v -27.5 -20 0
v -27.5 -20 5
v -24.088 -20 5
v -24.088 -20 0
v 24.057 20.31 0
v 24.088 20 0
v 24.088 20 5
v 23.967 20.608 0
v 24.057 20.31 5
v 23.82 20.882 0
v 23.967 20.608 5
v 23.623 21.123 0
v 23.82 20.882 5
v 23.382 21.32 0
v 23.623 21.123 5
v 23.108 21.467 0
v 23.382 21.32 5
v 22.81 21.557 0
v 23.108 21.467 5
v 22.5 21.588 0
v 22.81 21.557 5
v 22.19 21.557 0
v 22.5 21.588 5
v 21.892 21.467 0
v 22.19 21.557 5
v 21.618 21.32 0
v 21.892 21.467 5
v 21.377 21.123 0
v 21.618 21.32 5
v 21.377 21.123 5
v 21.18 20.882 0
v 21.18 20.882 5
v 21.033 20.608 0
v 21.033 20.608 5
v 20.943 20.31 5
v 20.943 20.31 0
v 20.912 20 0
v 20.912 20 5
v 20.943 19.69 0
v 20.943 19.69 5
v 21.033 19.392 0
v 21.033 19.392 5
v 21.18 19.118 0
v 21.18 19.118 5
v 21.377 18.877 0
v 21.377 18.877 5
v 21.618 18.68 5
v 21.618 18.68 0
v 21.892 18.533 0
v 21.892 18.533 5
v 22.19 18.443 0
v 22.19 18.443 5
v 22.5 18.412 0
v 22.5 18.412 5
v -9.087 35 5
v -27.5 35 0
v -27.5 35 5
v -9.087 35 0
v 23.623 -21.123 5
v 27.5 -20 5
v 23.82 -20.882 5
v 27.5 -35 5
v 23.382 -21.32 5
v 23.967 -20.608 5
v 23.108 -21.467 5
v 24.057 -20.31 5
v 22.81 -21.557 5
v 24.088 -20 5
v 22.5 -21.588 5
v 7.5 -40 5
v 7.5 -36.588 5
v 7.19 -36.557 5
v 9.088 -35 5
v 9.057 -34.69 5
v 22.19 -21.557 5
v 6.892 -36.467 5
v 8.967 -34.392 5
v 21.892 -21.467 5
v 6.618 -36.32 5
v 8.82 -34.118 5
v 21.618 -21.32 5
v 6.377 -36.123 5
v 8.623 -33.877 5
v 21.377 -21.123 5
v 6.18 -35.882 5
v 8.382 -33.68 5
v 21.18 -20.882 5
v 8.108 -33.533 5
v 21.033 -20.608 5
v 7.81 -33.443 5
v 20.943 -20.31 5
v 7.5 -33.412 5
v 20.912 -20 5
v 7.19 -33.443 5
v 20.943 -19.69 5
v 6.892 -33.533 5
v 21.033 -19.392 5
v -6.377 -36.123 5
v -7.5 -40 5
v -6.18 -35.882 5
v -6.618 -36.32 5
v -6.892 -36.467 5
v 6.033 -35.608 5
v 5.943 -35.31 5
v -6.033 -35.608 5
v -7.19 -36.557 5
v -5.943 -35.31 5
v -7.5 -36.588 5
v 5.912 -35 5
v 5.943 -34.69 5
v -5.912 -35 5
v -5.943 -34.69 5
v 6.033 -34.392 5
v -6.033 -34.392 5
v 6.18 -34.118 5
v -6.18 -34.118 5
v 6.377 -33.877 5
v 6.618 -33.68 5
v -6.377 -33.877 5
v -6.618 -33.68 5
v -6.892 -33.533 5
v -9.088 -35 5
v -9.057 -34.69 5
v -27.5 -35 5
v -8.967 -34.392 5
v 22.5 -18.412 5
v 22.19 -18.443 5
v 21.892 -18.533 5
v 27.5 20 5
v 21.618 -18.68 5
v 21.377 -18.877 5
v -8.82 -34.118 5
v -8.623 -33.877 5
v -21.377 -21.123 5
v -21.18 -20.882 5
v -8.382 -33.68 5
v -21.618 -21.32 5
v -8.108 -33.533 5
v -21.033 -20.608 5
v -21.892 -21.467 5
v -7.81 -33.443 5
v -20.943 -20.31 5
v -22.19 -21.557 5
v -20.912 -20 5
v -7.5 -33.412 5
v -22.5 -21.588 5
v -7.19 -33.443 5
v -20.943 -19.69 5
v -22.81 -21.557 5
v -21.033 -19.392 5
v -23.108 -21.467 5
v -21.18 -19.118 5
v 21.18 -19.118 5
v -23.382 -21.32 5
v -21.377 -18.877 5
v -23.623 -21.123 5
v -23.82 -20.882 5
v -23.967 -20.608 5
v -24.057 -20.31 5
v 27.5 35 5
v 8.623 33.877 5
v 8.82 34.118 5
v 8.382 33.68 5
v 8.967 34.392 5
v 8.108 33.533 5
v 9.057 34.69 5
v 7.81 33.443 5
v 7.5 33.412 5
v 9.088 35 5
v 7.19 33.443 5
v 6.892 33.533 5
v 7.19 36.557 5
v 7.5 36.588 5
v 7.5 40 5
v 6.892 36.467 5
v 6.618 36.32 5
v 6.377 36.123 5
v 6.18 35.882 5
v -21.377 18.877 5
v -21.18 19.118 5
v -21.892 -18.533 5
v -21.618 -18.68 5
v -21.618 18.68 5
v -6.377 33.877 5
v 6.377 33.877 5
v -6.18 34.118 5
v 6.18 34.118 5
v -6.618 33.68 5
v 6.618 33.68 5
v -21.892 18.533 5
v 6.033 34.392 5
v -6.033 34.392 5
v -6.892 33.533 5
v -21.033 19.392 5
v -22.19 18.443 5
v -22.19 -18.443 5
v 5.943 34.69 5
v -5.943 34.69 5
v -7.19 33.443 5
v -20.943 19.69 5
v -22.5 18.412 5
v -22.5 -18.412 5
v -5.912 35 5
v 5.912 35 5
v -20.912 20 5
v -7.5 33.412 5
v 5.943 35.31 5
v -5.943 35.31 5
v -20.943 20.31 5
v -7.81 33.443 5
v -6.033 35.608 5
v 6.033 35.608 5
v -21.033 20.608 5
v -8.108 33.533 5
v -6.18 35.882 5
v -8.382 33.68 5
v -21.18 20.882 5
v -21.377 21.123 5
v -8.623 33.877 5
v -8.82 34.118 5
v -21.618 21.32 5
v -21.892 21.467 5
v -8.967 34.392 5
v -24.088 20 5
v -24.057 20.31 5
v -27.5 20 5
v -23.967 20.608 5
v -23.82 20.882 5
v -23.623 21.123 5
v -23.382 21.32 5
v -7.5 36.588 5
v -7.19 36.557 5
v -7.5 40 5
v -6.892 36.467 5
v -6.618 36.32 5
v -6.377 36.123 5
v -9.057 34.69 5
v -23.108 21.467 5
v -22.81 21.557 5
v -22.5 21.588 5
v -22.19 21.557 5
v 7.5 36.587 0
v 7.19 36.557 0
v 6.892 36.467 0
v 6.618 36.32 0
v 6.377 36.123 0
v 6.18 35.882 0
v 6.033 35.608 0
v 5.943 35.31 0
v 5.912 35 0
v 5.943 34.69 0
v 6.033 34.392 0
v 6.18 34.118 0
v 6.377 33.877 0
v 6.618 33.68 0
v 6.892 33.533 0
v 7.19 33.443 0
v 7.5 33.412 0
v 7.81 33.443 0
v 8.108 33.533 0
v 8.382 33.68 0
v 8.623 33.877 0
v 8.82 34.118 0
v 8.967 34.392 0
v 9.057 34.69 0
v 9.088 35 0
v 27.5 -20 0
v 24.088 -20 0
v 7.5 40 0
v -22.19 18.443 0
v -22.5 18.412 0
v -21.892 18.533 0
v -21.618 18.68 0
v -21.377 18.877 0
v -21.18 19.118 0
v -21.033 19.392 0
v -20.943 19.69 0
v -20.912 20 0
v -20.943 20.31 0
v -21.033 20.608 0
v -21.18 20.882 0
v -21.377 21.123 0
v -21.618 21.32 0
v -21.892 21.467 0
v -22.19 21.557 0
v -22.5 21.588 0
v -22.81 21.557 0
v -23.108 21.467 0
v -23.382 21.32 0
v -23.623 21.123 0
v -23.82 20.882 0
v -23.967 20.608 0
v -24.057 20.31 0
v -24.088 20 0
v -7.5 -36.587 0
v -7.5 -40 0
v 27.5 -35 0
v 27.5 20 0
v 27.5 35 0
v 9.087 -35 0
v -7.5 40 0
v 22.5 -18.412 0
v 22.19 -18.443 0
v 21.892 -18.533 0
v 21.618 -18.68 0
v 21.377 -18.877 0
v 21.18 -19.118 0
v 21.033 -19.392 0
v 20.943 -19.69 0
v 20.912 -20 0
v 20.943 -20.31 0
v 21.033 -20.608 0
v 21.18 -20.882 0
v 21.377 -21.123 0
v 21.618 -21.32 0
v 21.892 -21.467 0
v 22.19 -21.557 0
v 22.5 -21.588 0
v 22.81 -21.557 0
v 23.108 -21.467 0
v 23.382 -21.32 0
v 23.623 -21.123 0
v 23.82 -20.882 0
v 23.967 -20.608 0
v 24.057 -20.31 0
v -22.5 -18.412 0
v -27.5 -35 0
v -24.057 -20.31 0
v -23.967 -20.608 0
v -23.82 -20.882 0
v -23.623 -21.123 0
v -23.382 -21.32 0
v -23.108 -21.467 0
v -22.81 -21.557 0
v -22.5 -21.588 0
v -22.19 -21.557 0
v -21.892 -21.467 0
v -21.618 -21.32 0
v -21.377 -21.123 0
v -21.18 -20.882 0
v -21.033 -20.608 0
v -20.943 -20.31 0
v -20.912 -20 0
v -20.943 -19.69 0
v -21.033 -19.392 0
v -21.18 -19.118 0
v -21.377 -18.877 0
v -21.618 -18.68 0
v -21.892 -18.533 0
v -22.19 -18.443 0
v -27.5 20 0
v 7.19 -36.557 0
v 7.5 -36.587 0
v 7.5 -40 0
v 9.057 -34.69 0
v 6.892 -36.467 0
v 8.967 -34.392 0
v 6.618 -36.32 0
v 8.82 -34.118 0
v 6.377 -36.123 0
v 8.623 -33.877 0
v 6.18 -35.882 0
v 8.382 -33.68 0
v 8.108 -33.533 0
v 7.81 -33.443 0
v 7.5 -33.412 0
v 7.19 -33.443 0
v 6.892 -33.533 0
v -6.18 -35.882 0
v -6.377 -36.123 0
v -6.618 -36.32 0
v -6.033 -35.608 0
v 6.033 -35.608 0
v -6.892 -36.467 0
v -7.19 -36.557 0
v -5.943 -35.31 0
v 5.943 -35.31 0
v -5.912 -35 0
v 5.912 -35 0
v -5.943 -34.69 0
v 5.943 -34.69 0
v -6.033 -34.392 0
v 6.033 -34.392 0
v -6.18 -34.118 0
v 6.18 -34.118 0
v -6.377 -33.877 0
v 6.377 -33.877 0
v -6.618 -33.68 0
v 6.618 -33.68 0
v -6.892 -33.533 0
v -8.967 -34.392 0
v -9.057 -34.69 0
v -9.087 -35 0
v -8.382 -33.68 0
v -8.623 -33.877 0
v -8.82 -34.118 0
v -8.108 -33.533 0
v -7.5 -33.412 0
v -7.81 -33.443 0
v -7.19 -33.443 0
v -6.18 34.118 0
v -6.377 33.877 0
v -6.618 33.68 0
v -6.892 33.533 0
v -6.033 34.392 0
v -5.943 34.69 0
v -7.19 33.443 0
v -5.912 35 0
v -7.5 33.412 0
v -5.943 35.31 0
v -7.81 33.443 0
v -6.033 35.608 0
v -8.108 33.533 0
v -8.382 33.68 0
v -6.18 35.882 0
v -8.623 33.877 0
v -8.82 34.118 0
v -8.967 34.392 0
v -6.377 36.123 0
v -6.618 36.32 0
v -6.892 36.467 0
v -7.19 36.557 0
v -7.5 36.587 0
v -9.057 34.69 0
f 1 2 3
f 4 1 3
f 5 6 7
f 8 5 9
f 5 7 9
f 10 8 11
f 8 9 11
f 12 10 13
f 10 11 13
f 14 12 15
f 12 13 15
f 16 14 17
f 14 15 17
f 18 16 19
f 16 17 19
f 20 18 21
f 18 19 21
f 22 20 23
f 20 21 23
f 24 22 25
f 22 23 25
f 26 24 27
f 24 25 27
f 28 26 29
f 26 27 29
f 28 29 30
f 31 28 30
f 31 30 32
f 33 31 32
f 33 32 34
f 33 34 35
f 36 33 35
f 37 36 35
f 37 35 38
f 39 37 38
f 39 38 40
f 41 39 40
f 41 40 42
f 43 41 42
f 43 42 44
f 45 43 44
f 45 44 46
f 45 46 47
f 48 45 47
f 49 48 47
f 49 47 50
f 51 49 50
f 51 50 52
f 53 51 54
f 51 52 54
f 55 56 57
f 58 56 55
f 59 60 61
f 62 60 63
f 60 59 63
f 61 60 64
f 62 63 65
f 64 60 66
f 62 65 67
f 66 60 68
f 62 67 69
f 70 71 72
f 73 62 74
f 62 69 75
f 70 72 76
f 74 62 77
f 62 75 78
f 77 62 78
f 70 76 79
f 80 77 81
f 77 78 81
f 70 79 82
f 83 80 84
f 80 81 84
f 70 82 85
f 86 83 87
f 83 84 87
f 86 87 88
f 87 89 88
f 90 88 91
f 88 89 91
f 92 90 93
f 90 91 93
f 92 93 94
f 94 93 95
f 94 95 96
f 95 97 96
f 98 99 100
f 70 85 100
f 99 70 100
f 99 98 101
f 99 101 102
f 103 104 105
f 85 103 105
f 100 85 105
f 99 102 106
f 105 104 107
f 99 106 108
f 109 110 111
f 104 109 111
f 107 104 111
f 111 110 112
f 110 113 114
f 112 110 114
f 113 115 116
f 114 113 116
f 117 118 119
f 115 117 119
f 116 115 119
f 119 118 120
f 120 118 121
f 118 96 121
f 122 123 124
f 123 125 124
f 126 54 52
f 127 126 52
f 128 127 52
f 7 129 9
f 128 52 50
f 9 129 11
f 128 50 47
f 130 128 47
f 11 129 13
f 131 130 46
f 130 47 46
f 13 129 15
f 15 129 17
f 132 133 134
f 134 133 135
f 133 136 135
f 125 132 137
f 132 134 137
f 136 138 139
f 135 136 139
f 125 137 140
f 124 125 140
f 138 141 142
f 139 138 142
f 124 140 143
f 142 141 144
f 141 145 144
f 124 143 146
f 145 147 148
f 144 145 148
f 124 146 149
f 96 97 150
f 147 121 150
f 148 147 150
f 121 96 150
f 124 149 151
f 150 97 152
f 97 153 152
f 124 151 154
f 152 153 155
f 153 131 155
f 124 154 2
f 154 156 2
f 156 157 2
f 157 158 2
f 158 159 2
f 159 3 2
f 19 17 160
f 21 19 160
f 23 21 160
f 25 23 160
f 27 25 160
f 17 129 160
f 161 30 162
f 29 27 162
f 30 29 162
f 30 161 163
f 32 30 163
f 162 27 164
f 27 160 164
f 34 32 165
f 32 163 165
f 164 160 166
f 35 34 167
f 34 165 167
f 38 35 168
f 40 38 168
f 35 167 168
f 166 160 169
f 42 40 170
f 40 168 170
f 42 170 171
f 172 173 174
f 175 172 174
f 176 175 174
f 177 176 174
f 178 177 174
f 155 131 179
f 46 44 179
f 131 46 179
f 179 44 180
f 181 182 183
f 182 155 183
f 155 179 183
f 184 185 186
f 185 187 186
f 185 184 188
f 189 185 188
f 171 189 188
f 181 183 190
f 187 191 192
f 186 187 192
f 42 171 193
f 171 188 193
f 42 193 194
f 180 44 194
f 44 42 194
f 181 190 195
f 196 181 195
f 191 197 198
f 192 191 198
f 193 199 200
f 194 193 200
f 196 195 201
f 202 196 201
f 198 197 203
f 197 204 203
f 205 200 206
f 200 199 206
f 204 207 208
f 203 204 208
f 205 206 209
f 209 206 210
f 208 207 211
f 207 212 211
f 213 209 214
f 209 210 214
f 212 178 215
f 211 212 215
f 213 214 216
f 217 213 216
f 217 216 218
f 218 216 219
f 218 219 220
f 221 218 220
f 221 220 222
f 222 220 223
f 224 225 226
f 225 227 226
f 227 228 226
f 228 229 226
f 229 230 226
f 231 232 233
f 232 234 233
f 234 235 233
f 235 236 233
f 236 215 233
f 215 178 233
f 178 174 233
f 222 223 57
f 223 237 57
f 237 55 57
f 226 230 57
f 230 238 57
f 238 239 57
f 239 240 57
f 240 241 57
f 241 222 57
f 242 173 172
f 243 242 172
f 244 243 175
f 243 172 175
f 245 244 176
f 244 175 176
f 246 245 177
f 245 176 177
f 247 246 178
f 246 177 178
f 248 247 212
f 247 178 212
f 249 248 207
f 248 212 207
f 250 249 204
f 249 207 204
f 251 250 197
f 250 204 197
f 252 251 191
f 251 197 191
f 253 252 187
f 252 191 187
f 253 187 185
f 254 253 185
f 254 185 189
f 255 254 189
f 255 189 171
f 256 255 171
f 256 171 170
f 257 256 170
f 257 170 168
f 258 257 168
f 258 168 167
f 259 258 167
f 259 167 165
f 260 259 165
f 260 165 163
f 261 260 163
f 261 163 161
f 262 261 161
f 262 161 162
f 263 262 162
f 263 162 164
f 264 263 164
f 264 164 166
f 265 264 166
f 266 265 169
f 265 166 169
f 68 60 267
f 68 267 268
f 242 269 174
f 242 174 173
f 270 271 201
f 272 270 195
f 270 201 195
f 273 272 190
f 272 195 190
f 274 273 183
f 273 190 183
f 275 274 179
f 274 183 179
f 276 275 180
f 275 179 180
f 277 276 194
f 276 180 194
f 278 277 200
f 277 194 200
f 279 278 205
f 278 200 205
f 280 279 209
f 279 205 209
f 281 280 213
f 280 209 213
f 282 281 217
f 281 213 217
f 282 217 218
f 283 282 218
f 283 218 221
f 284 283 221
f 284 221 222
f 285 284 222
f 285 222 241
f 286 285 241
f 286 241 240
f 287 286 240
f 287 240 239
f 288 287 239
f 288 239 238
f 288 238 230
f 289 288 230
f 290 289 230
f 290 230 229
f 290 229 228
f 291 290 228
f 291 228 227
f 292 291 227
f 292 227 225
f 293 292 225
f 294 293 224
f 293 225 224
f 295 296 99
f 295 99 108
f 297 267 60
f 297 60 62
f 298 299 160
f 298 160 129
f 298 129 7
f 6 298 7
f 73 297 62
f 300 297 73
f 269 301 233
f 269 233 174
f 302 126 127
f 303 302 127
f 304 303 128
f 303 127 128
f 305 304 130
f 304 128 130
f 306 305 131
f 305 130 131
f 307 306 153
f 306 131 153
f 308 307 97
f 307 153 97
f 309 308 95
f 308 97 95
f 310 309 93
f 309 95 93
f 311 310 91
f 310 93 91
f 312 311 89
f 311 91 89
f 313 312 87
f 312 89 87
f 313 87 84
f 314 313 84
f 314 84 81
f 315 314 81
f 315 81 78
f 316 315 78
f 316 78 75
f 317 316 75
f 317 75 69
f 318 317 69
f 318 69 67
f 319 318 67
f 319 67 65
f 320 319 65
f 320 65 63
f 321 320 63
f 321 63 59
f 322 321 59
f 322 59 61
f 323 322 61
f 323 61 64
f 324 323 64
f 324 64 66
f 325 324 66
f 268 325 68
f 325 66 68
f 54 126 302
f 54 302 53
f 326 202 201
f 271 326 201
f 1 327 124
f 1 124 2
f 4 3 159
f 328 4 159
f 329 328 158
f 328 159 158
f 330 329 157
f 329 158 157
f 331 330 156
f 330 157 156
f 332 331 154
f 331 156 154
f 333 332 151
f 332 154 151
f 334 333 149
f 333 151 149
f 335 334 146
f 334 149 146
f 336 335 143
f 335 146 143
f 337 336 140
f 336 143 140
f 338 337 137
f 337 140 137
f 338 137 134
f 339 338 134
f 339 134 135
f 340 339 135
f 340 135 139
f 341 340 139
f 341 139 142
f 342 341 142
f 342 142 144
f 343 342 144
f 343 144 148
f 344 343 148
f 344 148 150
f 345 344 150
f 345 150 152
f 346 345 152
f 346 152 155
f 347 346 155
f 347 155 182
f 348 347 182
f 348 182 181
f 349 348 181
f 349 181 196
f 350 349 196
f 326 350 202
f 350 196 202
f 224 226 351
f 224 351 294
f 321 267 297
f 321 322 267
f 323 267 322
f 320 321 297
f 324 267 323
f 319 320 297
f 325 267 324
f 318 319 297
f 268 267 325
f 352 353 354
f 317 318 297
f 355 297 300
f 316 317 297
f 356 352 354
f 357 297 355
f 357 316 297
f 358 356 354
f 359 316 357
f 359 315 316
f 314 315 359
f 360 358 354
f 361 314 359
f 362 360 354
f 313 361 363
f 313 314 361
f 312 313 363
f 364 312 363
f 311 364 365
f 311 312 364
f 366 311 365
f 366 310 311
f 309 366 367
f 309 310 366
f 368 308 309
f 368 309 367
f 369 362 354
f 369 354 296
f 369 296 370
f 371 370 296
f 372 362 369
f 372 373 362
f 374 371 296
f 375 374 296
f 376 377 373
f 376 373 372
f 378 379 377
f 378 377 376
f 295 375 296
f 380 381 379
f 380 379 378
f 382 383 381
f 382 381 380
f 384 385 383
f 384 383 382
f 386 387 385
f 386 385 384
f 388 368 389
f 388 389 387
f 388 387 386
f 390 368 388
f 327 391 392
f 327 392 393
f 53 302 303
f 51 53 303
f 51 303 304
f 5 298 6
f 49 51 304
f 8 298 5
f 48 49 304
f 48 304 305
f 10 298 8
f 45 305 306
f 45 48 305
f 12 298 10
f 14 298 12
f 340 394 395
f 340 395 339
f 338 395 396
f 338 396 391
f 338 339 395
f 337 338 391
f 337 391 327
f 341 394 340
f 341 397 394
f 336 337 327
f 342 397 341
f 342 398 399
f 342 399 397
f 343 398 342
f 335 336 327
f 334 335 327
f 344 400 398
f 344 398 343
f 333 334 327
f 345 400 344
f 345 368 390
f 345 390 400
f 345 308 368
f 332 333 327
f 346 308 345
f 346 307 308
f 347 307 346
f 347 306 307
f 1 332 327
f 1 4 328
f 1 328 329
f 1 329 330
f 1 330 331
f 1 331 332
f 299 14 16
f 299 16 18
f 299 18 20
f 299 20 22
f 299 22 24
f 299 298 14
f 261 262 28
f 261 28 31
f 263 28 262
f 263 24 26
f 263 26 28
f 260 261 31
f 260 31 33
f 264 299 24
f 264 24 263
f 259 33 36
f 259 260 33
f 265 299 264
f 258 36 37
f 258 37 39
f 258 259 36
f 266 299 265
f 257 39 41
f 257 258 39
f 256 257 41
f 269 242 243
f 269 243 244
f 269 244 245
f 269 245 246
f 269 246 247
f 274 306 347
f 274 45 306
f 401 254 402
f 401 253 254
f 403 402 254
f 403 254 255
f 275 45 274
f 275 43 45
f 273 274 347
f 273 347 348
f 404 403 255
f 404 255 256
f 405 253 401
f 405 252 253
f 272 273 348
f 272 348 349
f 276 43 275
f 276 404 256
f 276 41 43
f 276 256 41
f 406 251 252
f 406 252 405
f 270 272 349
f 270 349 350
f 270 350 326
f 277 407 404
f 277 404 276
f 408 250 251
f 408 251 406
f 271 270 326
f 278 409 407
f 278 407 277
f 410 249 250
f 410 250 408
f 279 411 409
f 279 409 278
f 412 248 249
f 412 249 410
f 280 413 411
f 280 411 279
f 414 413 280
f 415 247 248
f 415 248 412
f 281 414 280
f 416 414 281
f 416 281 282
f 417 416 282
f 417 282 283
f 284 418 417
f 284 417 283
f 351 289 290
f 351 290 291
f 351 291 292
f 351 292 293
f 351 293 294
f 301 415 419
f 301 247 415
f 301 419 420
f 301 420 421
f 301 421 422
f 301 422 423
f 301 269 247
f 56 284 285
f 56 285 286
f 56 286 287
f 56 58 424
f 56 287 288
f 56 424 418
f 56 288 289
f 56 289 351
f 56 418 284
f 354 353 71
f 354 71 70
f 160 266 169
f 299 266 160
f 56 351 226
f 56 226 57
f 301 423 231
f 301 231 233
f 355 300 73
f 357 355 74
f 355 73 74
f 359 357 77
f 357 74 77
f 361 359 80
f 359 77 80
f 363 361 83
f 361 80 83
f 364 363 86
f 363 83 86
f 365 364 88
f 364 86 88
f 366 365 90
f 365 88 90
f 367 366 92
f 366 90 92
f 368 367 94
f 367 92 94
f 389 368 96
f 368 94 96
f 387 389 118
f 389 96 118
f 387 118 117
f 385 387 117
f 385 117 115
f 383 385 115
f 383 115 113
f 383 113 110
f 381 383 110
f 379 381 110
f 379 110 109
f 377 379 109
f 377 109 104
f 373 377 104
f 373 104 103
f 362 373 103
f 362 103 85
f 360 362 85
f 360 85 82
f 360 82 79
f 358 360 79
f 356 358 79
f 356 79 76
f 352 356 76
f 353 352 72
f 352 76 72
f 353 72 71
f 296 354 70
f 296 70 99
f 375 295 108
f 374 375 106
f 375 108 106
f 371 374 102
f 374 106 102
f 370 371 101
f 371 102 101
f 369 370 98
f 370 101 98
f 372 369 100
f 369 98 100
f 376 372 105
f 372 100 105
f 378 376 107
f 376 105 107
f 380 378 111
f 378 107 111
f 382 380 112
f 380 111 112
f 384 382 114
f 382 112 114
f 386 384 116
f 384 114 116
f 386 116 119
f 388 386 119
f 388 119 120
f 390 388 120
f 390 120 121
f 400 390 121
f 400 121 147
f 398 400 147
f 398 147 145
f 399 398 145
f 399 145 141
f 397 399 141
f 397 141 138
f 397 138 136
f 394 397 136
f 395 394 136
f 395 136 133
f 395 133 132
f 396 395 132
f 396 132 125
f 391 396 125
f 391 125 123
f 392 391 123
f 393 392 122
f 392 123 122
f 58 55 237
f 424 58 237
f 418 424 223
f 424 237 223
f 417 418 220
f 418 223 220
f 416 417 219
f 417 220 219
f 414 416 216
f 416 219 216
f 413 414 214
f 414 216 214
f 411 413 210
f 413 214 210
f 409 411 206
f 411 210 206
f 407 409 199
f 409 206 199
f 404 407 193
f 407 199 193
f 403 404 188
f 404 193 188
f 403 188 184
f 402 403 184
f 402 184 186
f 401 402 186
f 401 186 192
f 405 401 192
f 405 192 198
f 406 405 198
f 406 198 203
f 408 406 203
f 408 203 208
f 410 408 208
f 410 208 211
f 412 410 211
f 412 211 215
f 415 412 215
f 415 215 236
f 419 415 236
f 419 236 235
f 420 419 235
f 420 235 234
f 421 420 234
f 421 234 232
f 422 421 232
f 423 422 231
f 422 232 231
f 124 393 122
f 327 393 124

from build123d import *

# Parameters (mm, degrees)
BOSS_EXTRUDE2_DEPTH = 5
SKETCH3_W           = 5
SKETCH3_H           = 40
CUT_EXTRUDE1_DEPTH  = 5
SKETCH4_R           = 1.5875
CUT_EXTRUDE2_DEPTH  = 6


with BuildPart() as part:
    # Sketch2 → Boss-Extrude2 (new body)
    with BuildSketch(Plane.XY):
        Polygon((-7.5, 40), (7.5, 40), (7.5, 35), (27.5, 35), (27.5, -35), (7.5, -35), (7.5, -40), (-7.5, -40), (-7.5, -35), (-27.5, -35), (-27.5, 35), (-7.5, 35), align=None)
    extrude(amount=BOSS_EXTRUDE2_DEPTH)

    # Sketch3 → Cut-Extrude1 (cut)
    with BuildSketch(Plane.XY.offset(5)):
        with Locations((-25, 0)):
            Rectangle(SKETCH3_W, SKETCH3_H)
    cut_extrude1 = extrude(amount=-CUT_EXTRUDE1_DEPTH, mode=Mode.SUBTRACT)

    # Mirror1: Cut-Extrude1 across plane
    add(cut_extrude1.mirror(Plane(origin=(0, 0, 0), x_dir=(0, 0, 1), z_dir=(1, 0, 0))), mode=Mode.SUBTRACT)

    # Sketch4 → Cut-Extrude2 (cut, through all)
    with BuildSketch(Plane.XY.offset(5)):
        with Locations((-22.5, 20)):
            Circle(SKETCH4_R)
        with Locations((-7.5, 35)):
            Circle(SKETCH4_R)
        with Locations((7.5, 35)):
            Circle(SKETCH4_R)
        with Locations((22.5, 20)):
            Circle(SKETCH4_R)
        with Locations((22.5, -20)):
            Circle(SKETCH4_R)
        with Locations((7.5, -35)):
            Circle(SKETCH4_R)
        with Locations((-7.5, -35)):
            Circle(SKETCH4_R)
        with Locations((-22.5, -20)):
            Circle(SKETCH4_R)
    extrude(amount=-CUT_EXTRUDE2_DEPTH, mode=Mode.SUBTRACT)


solid = part.part
